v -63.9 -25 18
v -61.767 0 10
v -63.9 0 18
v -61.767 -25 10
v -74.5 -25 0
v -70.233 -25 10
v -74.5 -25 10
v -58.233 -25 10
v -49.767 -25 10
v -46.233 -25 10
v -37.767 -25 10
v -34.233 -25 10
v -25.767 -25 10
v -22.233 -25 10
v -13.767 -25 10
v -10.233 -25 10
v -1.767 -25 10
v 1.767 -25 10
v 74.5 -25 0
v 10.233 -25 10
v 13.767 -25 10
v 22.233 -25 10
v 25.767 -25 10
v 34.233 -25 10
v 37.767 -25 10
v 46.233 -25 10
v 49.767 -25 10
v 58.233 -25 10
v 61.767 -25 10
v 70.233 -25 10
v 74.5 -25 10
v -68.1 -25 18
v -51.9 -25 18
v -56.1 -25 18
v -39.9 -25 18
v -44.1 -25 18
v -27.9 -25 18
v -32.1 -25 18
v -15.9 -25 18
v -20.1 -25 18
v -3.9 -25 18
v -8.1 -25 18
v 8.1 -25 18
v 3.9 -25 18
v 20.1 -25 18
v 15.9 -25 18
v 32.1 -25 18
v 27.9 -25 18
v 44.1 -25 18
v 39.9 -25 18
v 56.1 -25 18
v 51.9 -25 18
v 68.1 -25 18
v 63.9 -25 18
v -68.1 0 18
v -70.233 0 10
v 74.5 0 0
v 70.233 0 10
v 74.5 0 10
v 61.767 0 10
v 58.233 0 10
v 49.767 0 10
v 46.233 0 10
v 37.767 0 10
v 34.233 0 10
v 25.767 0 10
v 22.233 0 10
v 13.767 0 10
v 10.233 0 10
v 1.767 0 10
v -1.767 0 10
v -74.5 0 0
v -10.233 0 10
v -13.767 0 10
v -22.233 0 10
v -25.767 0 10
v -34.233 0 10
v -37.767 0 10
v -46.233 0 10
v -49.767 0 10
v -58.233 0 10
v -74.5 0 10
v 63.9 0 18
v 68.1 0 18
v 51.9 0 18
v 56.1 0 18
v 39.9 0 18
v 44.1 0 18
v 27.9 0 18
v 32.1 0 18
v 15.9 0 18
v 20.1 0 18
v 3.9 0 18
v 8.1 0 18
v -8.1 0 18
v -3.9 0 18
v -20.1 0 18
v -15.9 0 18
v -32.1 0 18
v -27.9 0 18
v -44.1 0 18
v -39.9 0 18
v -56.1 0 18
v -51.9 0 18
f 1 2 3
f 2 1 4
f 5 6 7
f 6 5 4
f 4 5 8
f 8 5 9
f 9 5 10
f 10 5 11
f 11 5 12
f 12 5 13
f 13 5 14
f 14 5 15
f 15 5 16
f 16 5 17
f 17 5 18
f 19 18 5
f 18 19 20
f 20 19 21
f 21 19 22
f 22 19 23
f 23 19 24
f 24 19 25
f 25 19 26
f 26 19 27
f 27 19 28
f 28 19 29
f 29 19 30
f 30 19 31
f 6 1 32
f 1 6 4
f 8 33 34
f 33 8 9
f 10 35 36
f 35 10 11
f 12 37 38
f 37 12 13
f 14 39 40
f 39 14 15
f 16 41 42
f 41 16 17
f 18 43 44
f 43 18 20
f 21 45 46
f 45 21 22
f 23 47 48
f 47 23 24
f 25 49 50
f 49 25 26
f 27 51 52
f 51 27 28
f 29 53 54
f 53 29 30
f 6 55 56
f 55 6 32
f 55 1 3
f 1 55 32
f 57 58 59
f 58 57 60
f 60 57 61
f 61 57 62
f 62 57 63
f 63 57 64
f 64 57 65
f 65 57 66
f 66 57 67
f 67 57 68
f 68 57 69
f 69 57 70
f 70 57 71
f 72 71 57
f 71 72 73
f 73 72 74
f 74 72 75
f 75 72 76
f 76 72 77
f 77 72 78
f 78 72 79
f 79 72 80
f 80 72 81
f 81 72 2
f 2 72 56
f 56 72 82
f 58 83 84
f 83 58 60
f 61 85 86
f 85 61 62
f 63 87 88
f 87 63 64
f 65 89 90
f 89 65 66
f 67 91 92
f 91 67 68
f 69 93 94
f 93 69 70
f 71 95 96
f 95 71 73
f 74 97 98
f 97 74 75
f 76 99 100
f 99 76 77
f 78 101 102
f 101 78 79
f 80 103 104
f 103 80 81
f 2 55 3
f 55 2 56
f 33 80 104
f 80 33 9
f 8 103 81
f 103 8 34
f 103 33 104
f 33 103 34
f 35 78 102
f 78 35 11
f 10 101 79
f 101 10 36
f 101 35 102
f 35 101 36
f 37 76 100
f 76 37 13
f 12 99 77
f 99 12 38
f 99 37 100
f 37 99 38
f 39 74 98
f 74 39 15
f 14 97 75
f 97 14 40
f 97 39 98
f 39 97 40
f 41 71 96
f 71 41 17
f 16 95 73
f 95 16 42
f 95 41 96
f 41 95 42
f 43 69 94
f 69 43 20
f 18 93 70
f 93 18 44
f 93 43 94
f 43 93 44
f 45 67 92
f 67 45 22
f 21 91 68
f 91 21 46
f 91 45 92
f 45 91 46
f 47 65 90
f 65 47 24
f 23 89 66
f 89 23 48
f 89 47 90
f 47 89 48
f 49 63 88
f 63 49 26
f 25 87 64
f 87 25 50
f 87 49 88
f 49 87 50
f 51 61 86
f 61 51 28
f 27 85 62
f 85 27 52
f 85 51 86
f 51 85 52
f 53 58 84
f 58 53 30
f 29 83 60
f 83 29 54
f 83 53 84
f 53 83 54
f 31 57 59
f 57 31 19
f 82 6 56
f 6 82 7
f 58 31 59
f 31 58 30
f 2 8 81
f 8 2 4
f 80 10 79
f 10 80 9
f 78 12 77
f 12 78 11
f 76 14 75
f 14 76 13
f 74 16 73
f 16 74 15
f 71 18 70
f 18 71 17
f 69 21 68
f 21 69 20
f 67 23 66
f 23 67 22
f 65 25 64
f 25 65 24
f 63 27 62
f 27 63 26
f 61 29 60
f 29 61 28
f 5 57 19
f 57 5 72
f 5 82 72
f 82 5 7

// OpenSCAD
$fn = 32;

// ----------------------------------------------------------------------
// Toothed rack, 12 teeth
// 12 mm pitch, 8 mm teeth
// ----------------------------------------------------------------------

// --- parameters (mm) ---
bar_w = 25;     // bar width (Y)
bar_h = 10;     // bar height (Z)
teeth = 12;     // number of teeth
pitch = 12;     // tooth pitch
tooth_h = 8;    // tooth height above the bar
root_w = 9;     // tooth width at the root
crest_w = 4.2;  // tooth width at the crest

// --- derived feature positions (mm) ---
span = (teeth - 1) * pitch;  // = 132   distance between the outer teeth
bar_l = span + root_w + 8;   // = 149   bar length: teeth plus 4 mm at each end
tooth_x = -span / 2;         // = -66   X of the first tooth
height = bar_h + tooth_h;    // = 18   overall height
feature_centers = [
  [tooth_x + 0 * pitch, -bar_w / 2],
  [tooth_x + 1 * pitch, -bar_w / 2],
  [tooth_x + 2 * pitch, -bar_w / 2],
  [tooth_x + 3 * pitch, -bar_w / 2],
  [tooth_x + 4 * pitch, -bar_w / 2],
  [tooth_x + 5 * pitch, -bar_w / 2],
  [tooth_x + 6 * pitch, -bar_w / 2],
  [tooth_x + 7 * pitch, -bar_w / 2],
  [tooth_x + 8 * pitch, -bar_w / 2],
  [tooth_x + 9 * pitch, -bar_w / 2],
  [tooth_x + 10 * pitch, -bar_w / 2],
  [tooth_x + 11 * pitch, -bar_w / 2]
];   // tooth centre line, drives the tooth loop

// bar with a rack of teeth, one extruded trapezoium per centre
module rack_tooth() {
  linear_extrude(height = bar_w)
    polygon(points = [
      [0, 0],
      [root_w, 0],
      [root_w / 2 + crest_w / 2, tooth_h + 1],
      [root_w / 2 - crest_w / 2, tooth_h + 1]
    ]);
}

union() {
  translate([-bar_l / 2, -bar_w, 0]) cube([bar_l, bar_w, bar_h]);
  for (centre = feature_centers)
    translate([centre[0] - root_w / 2, 0, bar_h - 1]) rotate([90, 0, 0]) rack_tooth();
}
